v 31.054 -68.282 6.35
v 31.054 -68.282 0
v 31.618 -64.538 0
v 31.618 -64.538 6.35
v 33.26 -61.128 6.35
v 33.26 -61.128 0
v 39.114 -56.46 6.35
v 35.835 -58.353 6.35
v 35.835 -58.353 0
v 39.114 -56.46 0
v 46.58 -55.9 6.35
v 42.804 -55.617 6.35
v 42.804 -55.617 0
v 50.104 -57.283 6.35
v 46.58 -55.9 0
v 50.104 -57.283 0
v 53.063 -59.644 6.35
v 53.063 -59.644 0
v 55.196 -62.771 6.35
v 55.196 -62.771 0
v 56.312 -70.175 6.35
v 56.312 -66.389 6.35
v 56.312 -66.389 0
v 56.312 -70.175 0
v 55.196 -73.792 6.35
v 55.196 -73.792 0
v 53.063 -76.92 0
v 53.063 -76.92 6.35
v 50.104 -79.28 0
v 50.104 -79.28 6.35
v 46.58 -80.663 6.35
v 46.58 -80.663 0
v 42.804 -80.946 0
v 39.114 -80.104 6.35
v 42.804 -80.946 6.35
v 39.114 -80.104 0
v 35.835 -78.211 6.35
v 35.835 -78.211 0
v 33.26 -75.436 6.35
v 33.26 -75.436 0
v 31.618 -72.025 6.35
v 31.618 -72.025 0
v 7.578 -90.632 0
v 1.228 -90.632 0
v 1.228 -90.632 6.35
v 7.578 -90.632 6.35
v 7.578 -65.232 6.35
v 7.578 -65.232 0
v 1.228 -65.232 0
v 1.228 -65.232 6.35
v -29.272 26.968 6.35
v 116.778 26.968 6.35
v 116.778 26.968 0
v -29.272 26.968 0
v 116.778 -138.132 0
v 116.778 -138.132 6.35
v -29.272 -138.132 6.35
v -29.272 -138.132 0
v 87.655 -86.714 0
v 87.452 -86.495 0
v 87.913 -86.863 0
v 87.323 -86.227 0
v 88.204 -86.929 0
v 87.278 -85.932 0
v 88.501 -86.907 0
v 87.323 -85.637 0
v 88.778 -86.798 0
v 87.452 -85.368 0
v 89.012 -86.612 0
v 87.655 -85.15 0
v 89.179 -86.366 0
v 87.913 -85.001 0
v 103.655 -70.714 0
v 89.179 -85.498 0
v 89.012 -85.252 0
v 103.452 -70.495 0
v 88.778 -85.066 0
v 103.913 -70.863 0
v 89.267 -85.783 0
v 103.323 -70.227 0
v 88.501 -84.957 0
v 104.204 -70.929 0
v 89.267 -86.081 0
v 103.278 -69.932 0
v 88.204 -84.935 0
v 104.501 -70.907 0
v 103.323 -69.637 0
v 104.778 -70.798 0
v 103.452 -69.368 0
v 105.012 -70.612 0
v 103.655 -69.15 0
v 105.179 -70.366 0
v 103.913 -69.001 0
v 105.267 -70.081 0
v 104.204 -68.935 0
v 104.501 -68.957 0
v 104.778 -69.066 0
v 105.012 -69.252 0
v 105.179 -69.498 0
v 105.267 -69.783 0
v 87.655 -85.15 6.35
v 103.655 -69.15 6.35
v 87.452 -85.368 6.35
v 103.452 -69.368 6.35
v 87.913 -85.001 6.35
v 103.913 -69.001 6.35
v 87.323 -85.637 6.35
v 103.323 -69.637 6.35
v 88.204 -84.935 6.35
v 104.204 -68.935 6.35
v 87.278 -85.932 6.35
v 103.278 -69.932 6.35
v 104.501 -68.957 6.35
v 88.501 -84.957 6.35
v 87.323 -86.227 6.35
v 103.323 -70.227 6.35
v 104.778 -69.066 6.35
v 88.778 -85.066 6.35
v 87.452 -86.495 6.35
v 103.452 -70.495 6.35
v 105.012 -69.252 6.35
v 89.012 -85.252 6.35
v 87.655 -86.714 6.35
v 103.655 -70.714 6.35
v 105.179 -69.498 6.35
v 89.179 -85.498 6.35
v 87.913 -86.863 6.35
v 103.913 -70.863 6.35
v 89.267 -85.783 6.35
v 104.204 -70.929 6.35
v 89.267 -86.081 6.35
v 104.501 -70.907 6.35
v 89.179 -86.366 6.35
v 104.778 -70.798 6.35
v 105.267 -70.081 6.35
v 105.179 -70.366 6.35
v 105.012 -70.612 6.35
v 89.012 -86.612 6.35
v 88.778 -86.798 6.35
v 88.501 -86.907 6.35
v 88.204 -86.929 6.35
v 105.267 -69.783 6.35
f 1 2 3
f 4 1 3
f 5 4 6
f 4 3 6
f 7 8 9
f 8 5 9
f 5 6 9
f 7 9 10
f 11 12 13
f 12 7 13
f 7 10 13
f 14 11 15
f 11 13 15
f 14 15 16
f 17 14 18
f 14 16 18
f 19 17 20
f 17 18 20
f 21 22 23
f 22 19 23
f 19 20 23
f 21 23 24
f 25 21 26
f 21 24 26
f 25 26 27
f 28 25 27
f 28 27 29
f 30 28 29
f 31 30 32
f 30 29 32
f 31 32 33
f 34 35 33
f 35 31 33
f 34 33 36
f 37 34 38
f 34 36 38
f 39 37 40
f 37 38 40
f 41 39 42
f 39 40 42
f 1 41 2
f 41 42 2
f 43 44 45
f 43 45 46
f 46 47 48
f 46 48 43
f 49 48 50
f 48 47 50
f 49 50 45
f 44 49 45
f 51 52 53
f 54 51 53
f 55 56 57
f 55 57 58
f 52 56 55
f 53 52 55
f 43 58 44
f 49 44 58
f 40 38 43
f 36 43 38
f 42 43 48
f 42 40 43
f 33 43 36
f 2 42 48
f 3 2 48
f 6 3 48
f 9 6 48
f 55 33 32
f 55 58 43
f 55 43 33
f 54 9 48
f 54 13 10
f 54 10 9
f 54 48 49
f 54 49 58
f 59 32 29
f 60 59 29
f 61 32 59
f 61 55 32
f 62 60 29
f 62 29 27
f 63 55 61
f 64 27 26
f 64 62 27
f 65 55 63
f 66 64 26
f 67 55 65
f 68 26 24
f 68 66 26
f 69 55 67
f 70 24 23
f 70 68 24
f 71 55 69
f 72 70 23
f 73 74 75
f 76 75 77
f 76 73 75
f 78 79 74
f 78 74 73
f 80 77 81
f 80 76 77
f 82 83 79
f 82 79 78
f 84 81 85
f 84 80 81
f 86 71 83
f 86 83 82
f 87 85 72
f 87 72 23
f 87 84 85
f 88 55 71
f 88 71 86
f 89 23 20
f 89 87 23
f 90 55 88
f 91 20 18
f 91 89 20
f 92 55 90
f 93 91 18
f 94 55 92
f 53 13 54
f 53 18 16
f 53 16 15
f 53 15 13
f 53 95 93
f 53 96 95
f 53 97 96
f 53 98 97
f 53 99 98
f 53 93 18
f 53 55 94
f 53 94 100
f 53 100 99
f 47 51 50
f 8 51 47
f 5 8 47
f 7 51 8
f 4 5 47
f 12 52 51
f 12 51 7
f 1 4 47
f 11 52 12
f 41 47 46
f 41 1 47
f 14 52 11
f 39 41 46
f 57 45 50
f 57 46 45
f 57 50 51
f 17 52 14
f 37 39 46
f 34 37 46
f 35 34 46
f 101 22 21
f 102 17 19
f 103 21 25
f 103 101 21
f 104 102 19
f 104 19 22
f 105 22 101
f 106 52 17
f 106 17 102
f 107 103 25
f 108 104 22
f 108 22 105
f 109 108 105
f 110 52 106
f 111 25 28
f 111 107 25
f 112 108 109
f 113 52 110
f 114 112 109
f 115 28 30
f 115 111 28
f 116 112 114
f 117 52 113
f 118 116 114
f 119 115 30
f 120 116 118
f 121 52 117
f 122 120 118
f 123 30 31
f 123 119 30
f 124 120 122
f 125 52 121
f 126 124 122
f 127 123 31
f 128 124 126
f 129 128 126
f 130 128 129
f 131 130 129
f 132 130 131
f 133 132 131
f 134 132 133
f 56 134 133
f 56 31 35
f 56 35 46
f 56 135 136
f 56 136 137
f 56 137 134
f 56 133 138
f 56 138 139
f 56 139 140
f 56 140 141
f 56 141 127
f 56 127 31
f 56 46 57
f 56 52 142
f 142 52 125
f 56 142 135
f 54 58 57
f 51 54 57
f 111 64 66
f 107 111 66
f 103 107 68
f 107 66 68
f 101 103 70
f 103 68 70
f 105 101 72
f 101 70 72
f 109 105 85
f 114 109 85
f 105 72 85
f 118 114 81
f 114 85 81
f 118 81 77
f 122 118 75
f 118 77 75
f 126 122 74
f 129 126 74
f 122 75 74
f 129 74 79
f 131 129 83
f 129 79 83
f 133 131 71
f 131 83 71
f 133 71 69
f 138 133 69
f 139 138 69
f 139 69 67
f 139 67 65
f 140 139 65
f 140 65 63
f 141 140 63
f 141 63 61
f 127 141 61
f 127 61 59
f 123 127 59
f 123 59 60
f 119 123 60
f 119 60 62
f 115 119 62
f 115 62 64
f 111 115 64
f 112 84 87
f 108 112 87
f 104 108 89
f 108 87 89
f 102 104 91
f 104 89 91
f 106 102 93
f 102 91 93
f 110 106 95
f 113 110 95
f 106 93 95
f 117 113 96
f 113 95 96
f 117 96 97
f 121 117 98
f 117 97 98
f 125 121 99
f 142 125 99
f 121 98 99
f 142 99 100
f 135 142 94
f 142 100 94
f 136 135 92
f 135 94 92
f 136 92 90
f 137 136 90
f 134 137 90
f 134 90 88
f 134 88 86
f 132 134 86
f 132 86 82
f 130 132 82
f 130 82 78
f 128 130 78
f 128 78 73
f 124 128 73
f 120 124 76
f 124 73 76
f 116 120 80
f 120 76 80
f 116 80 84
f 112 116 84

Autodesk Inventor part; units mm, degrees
ref_plane "YZ Plane" through (0, 0, 0) normal (1, 0, 0) x (0, 1, 0)
ref_plane "XZ Plane" through (0, 0, 0) normal (0, 1, 0) x (-1, 0, 0)
ref_plane "XY Plane" through (0, 0, 0) normal (0, 0, 1) x (1, 0, 0)
sketch "Sketch1" plane through (0, 0, 0) normal (0, 0, 1) x (1, 0, 0)
  line L0 (-19.7465, 14.2682) -> (107.2535, 14.2682)
  line L1 (107.2535, 14.2682) -> (107.2535, -112.7318)
  line L2 (107.2535, -112.7318) -> (-19.7465, -112.7318)
  line L3 (-19.7465, -112.7318) -> (-19.7465, 14.2682)
  point P0 (0, 0)
  dimension "d0" = 127
  dimension "d1" = 127
extrude "Extrusion1" add sketch "Sketch1" along normal blind 6.35
sketch "Sketch2" plane through (0, 0, 6.35) normal (0, 0, 1) x (1, 0, 0)
  line L0 (107.2535, -112.7318) -> (-19.7465, -112.7318)
  line L1 (-19.7465, -112.7318) -> (43.7535, -112.7318)
  line L2 (43.7535, -112.7318) -> (43.7535, -61.9318)
  line L3 (43.7535, -61.9318) -> (66.7535, -61.9318)
  line L4 (66.7535, -61.9318) -> (73.1035, -61.9318)
  line L5 (73.1035, -61.9318) -> (113.1035, -61.9318)
  line L6 (113.1035, -61.9318) -> (113.1035, -93.9318)
  line L7 (113.1035, -93.9318) -> (73.1035, -93.9318)
  line L8 (73.1035, -93.9318) -> (73.1035, -61.9318)
  point P0 (0, 0)
  dimension "d4" = 50.8
  dimension "d5" = 23
  dimension "d6" = 6.35
  dimension "d7" = 40
  dimension "d8" = 32
extrude "Extrusion2" add sketch "Sketch2" along normal blind 6.35
sketch "Sketch3" plane through (107.2535, -112.7318, 0) normal (1, 0, 0) x (0, 0, -1)
  line L0 (-6.35, 127) -> (-6.35, 50.8)
  line L1 (-6.35, 50.8) -> (-6.35, 18.8)
  line L2 (-6.35, 18.8) -> (-6.35, 0)
  line L3 (0, 0) -> (-6.35, 0)
  line L4 (0, 127) -> (0, 0)
  line L5 (0, 127) -> (-6.35, 127)
  point P0 (0, 112.7318)
extrude "Extrusion3" add sketch "Sketch3" along normal blind 12.7
sketch "Sketch4" plane through (-19.7465, -112.7318, 0) normal (-1, 0, 0) x (0, 0, 1)
  line L0 (6.35, 0) -> (6.35, 127)
  line L1 (0, 127) -> (6.35, 127)
  line L2 (0, 0) -> (0, 127)
  line L3 (0, 0) -> (6.35, 0)
  point P0 (0, 112.7318)
extrude "Extrusion4" add sketch "Sketch4" along normal blind 12.7
sketch "Sketch5" plane through (0, 0, 6.35) normal (0, 0, 1) x (1, 0, 0)
  line L0 (119.9535, -112.7318) -> (-32.4465, -112.7318)
  line L1 (119.9535, -112.7318) -> (43.7535, -112.7318)
  line L2 (43.7535, -112.7318) -> (43.7535, -61.9318)
  line L3 (43.7535, -61.9318) -> (20.7535, -61.9318)
  line L4 (20.7535, -61.9318) -> (14.4035, -61.9318)
  line L5 (14.4035, -61.9318) -> (8.0535, -61.9318)
  line L6 (8.0535, -61.9318) -> (14.4035, -61.9318)
  line L7 (14.4035, -61.9318) -> (14.4035, -87.3318)
  line L8 (14.4035, -87.3318) -> (8.0535, -87.3318)
  line L9 (8.0535, -87.3318) -> (8.0535, -61.9318)
  point P0 (0, 0)
  dimension "d15" = 23
  dimension "d16" = 6.35
  dimension "d17" = 6.35
  dimension "d18" = 25.4
extrude "Extrusion5" cut sketch "Sketch5" against normal blind 12.7
sketch "Sketch6" plane through (0, 0, 6.35) normal (0, 0, 1) x (1, 0, 0)
  line L0 (119.9535, -112.7318) -> (119.9535, 14.2682)
  line L1 (113.1035, -61.9318) -> (119.9535, -61.9318)
  line L2 (119.9535, -61.9318) -> (119.9535, -93.9318)
  line L3 (119.9535, -93.9318) -> (113.1035, -93.9318)
  line L4 (113.1035, -93.9318) -> (113.1035, -61.9318)
  point P0 (0, 0)
extrude "Extrusion6" cut sketch "Sketch6" against normal blind 12.7
sketch "Sketch7" plane through (0, 0, 12.7) normal (0, 0, 1) x (1, 0, 0)
  line L0 (73.1035, -61.9318) -> (113.1035, -61.9318)
  line L1 (73.1035, -93.9318) -> (73.1035, -61.9318)
  line L2 (113.1035, -93.9318) -> (73.1035, -93.9318)
  line L3 (113.1035, -61.9318) -> (113.1035, -93.9318)
  point P0 (0, 0)
extrude "Extrusion7" cut sketch "Sketch7" against normal blind 6.35
sketch "Sketch8" plane through (0, 0, 6.35) normal (0, 0, 1) x (1, 0, 0)
  line L0 (14.4035, -61.9318) -> (14.4035, -87.3318)
  line L1 (113.1035, -61.9318) -> (4.4035, -61.9318)
  line L2 (4.4035, -61.9318) -> (8.0535, -61.9318)
  line L3 (8.0535, -61.9318) -> (8.0535, -87.3318)
  line L4 (8.0535, -87.3318) -> (4.4035, -87.3318)
  line L5 (4.4035, -87.3318) -> (4.4035, -61.9318)
  point P0 (0, 0)
  dimension "d25" = 108.7
extrude "Extrusion8" cut sketch "Sketch8" against normal blind 6.35
sketch "Sketch9" plane through (0, 0, 6.35) normal (0, 0, 1) x (1, 0, 0)
  line L0 (4.4035, -61.9318) -> (14.4035, -61.9318)
  line L1 (14.4035, -61.9318) -> (14.4035, -87.3318)
  line L2 (14.4035, -87.3318) -> (4.4035, -87.3318)
  line L3 (4.4035, -87.3318) -> (4.4035, -61.9318)
  line L4 (4.4035, -61.9318) -> (10.7535, -61.9318)
  line L5 (10.7535, -61.9318) -> (10.7535, -87.3318)
  line L6 (10.7535, -87.3318) -> (4.4035, -87.3318)
  line L7 (4.4035, -87.3318) -> (4.4035, -61.9318)
  point P0 (0, 0)
  dimension "d28" = 6.35
extrude "Extrusion9" add sketch "Sketch9" against normal blind 6.35 contours L0 L1 L2 L5
sketch "Sketch10" plane through (0, 0, 0) normal (0, 0, -1) x (-1, 0, 0)
  line L0 (-113.1035, -61.9318) -> (-101.1035, -61.9318)
  line L1 (-101.1035, -61.9318) -> (-101.1035, -69.9318)
  line L2 (-101.1035, -69.9318) -> (-113.1035, -69.9318)
  line L3 (-113.1035, -69.9318) -> (-113.1035, -61.9318)
  line L4 (-101.1035, -69.9318) -> (-85.1035, -69.9318)
  line L5 (-85.1035, -69.9318) -> (-85.1035, -85.9318)
  line L6 (-85.1035, -85.9318) -> (-101.1035, -85.9318)
  line L7 (-101.1035, -85.9318) -> (-101.1035, -69.9318)
  circle A0 centre (-101.1035, -69.9318) radius 1
  circle A1 centre (-85.1035, -85.9318) radius 1
  point P0 (0, 0)
  dimension "d31" = 12
  dimension "d32" = 8
  dimension "d33" = 16
  dimension "d34" = 16
  dimension "d35" = 2
  dimension "d36" = 2
extrude "Extrusion10" cut sketch "Sketch10" against normal blind 6.35 contours A0 L4 L1 | L1 L2 A0 | L2 L7 A0 | L4 A0 L7 | A1 L6 L5 | L5 L6 A1
sketch "Sketch11" plane through (113.1035, -93.9318, 6.35) normal (1, 0, 0) x (0, 0, -1)
  line L0 (0, 32) -> (0, 0)
  line L1 (0, 0) -> (6.35, 0)
  line L2 (6.35, 32) -> (6.35, 0)
  line L3 (0, 32) -> (6.35, 32)
  point P0 (6.35, 93.9318)
extrude "Extrusion11" add sketch "Sketch11" along normal blind 7.62
sketch "Sketch12" plane through (119.9535, -112.7318, 0) normal (1, 0, 0) x (0, 0, -1)
  line L0 (-6.35, 50.8) -> (0, 50.8)
  line L1 (0, 50.8) -> (0, 11.311)
  line L2 (0, 11.311) -> (-6.35, 11.311)
  line L3 (-6.35, 11.311) -> (-6.35, 50.8)
  point P0 (0, 112.7318)
extrude "Extrusion12" cut sketch "Sketch12" along normal blind 7.62
sketch "Sketch13" plane through (0, 0, 0) normal (0, 0, -1) x (-1, 0, 0)
  line L0 (-10.7535, -87.3318) -> (-4.4035, -87.3318)
  line L1 (-4.4035, -87.3318) -> (-4.4035, -90.6318)
  line L2 (-4.4035, -90.6318) -> (-10.7535, -90.6318)
  line L3 (-10.7535, -90.6318) -> (-10.7535, -87.3318)
  point P0 (0, 0)
  dimension "d43" = 3.3
extrude "Extrusion13" cut sketch "Sketch13" against normal blind 7.62
sketch "Sketch14" plane through (0, 0, 0) normal (0, 0, -1) x (-1, 0, 0)
  line L0 (-4.4035, -61.9318) -> (-4.4035, -90.6318)
  line L1 (-10.7535, -61.9318) -> (-4.4035, -61.9318)
  line L2 (-4.4035, -61.9318) -> (-4.4035, -65.2318)
  line L3 (-4.4035, -65.2318) -> (-10.7535, -65.2318)
  line L4 (-10.7535, -65.2318) -> (-10.7535, -61.9318)
  point P0 (0, 0)
  dimension "d46" = 3.3
extrude "Extrusion14" add sketch "Sketch14" against normal blind 7.62
sketch "Sketch15" plane through (0, 0, 7.62) normal (0, 0, 1) x (1, 0, 0)
  line L0 (10.7535, -65.2318) -> (4.4035, -65.2318)
  line L1 (10.7535, -61.9318) -> (10.7535, -65.2318)
  line L2 (4.4035, -61.9318) -> (10.7535, -61.9318)
  line L3 (4.4035, -65.2318) -> (4.4035, -61.9318)
  point P0 (0, 0)
extrude "Extrusion15" cut sketch "Sketch15" against normal blind 1.27
sketch "Sketch16" plane through (119.9535, -112.7318, 0) normal (0, -1, 0) x (1, 0, 0)
  line L0 (0, 6.35) -> (-152.4, 6.35)
  line L1 (-152.4, 6.35) -> (-152.4, 0)
  line L2 (0, 0) -> (-152.4, 0)
  line L3 (0, 0) -> (0, 6.35)
  point P0 (-119.9535, 0)
extrude "Extrusion16" add sketch "Sketch16" along normal blind 25.4
sketch "Sketch17" plane through (119.9535, 14.2682, 6.35) normal (0, 1, 0) x (1, 0, 0)
  line L0 (-152.4, 0) -> (0, 0)
  line L1 (-152.4, 6.35) -> (0, 6.35)
  line L2 (0, 0) -> (-6.35, 0)
  line L3 (-6.35, 0) -> (-6.35, 6.35)
  line L4 (-6.35, 6.35) -> (0, 6.35)
  line L5 (0, 6.35) -> (0, 0)
  line L6 (-152.4, 6.35) -> (-146.05, 6.35)
  line L7 (-146.05, 6.35) -> (-146.05, 0)
  line L8 (-146.05, 0) -> (-152.4, 0)
  line L9 (-152.4, 0) -> (-152.4, 6.35)
  point P0 (-119.9535, 6.35)
  dimension "d53" = 6.35
  dimension "d54" = 6.35
extrude "Extrusion17" cut sketch "Sketch17" against normal blind 177.8 contours L9 L1 L7 L0 | L3 L1 L5 L0
sketch "Sketch18" plane through (0, 0, 0) normal (0, 0, -1) x (-1, 0, 0)
  line L0 (-113.6035, -138.1318) -> (26.0965, -138.1318)
  line L1 (-10.7535, -65.2318) -> (-4.4035, -65.2318)
  line L2 (-43.7535, -138.1318) -> (-43.7535, -112.7318)
  circle A0 centre (-43.7535, -112.7318) radius 12.7
  point P0 (0, 0)
  dimension "d57" = 25.4
  dimension "d58" = 25.4
extrude "Extrusion18" cut sketch "Sketch18" against normal blind 25.4
sketch "Sketch19" plane through (0, 0, 0) normal (0, 0, -1) x (-1, 0, 0)
  line L0 (-113.6035, -138.1318) -> (26.0965, -138.1318)
  line L1 (-10.7535, -65.2318) -> (-4.4035, -65.2318)
  line L2 (-43.7535, -138.1318) -> (-43.7535, -68.2818)
  circle A0 centre (-43.7535, -68.2818) radius 12.7
  point P0 (0, 0)
  dimension "d61" = 69.85
  dimension "d62" = 25.4
extrude "Extrusion19" cut sketch "Sketch19" against normal blind 25.4
sketch "Sketch20" plane through (0, 0, 0) normal (0, 0, -1) x (-1, 0, 0)
  circle A0 centre (-43.7535, -112.7318) radius 12.7
  point P0 (0, 0)
extrude "Extrusion20" add sketch "Sketch20" against normal blind 6.35
sketch "Sketch21" plane through (-26.0965, 14.2682, 6.35) normal (0, 1, 0) x (1, 0, 0)
  line L0 (0, 6.35) -> (0, 0)
  line L1 (0, 0) -> (139.7, 0)
  line L2 (139.7, 0) -> (139.7, 6.35)
  line L3 (0, 6.35) -> (139.7, 6.35)
  point P0 (26.0965, 6.35)
extrude "Extrusion21" add sketch "Sketch21" along normal blind 12.7
sketch "Sketch22" plane through (113.6035, -138.1318, 6.35) normal (1, 0, 0) x (0, 0, -1)
  line L0 (6.35, 0) -> (0, 0)
  line L1 (6.35, 165.1) -> (6.35, 0)
  line L2 (6.35, 165.1) -> (0, 165.1)
  line L3 (0, 0) -> (0, 165.1)
  point P0 (6.35, 138.1318)
extrude "Extrusion22" add sketch "Sketch22" along normal blind 3.175
sketch "Sketch23" plane through (-26.0965, -138.1318, 0) normal (-1, 0, 0) x (0, 0, 1)
  line L0 (6.35, 0) -> (0, 0)
  line L1 (6.35, 165.1) -> (6.35, 0)
  line L2 (6.35, 165.1) -> (0, 165.1)
  line L3 (0, 0) -> (0, 165.1)
  point P0 (0, 138.1318)
extrude "Extrusion23" add sketch "Sketch23" along normal blind 3.175
sketch "Sketch24" plane through (0, 0, 6.35) normal (0, 0, 1) x (1, 0, 0)
  line L0 (4.4035, -65.2318) -> (1.2285, -65.2318)
  line L1 (1.2285, -65.2318) -> (1.2285, -90.6318)
  line L2 (1.2285, -90.6318) -> (4.4035, -90.6318)
  line L3 (4.4035, -90.6318) -> (4.4035, -65.2318)
  point P0 (0, 0)
  dimension "d73" = 3.175
extrude "Extrusion24" cut sketch "Sketch24" against normal blind 6.35
sketch "Sketch25" plane through (0, 0, 6.35) normal (0, 0, 1) x (1, 0, 0)
  line L0 (10.7535, -65.2318) -> (7.5785, -65.2318)
  line L1 (7.5785, -65.2318) -> (7.5785, -91.3197)
  line L2 (7.5785, -91.3197) -> (10.7535, -91.3197)
  line L3 (10.7535, -91.3197) -> (10.7535, -65.2318)
  point P0 (0, 0)
  dimension "d76" = 3.175
extrude "Extrusion25" add sketch "Sketch25" against normal blind 6.35
sketch "Sketch26" plane through (0, 0, 0) normal (0, 0, -1) x (-1, 0, 0)
  circle A0 centre (-101.1035, -69.9318) radius 1
  circle A1 centre (-85.1035, -85.9318) radius 1
  line L0 (-1.2285, -90.6318) -> (-7.5785, -90.6318)
  line L1 (-101.1035, -69.9318) -> (-104.2785, -69.9318)
  line L2 (-85.1035, -85.9318) -> (-88.2785, -85.9318)
  circle A2 centre (-104.2785, -69.9318) radius 1
  circle A3 centre (-88.2785, -85.9318) radius 1
  point P0 (0, 0)
  dimension "d79" = 3.175
  dimension "d80" = 3.175
extrude "Extrusion26" cut sketch "Sketch26" against normal blind 6.35 contours A2 | A3
sketch "Sketch27" plane through (0, 0, 0) normal (0, 0, -1) x (-1, 0, 0)
  circle A0 centre (-101.1035, -69.9318) radius 1
  circle A1 centre (-85.1035, -85.9318) radius 1
  point P0 (0, 0)
extrude "Extrusion27" add sketch "Sketch27" against normal blind 6.35
properties part number "frontbase"
